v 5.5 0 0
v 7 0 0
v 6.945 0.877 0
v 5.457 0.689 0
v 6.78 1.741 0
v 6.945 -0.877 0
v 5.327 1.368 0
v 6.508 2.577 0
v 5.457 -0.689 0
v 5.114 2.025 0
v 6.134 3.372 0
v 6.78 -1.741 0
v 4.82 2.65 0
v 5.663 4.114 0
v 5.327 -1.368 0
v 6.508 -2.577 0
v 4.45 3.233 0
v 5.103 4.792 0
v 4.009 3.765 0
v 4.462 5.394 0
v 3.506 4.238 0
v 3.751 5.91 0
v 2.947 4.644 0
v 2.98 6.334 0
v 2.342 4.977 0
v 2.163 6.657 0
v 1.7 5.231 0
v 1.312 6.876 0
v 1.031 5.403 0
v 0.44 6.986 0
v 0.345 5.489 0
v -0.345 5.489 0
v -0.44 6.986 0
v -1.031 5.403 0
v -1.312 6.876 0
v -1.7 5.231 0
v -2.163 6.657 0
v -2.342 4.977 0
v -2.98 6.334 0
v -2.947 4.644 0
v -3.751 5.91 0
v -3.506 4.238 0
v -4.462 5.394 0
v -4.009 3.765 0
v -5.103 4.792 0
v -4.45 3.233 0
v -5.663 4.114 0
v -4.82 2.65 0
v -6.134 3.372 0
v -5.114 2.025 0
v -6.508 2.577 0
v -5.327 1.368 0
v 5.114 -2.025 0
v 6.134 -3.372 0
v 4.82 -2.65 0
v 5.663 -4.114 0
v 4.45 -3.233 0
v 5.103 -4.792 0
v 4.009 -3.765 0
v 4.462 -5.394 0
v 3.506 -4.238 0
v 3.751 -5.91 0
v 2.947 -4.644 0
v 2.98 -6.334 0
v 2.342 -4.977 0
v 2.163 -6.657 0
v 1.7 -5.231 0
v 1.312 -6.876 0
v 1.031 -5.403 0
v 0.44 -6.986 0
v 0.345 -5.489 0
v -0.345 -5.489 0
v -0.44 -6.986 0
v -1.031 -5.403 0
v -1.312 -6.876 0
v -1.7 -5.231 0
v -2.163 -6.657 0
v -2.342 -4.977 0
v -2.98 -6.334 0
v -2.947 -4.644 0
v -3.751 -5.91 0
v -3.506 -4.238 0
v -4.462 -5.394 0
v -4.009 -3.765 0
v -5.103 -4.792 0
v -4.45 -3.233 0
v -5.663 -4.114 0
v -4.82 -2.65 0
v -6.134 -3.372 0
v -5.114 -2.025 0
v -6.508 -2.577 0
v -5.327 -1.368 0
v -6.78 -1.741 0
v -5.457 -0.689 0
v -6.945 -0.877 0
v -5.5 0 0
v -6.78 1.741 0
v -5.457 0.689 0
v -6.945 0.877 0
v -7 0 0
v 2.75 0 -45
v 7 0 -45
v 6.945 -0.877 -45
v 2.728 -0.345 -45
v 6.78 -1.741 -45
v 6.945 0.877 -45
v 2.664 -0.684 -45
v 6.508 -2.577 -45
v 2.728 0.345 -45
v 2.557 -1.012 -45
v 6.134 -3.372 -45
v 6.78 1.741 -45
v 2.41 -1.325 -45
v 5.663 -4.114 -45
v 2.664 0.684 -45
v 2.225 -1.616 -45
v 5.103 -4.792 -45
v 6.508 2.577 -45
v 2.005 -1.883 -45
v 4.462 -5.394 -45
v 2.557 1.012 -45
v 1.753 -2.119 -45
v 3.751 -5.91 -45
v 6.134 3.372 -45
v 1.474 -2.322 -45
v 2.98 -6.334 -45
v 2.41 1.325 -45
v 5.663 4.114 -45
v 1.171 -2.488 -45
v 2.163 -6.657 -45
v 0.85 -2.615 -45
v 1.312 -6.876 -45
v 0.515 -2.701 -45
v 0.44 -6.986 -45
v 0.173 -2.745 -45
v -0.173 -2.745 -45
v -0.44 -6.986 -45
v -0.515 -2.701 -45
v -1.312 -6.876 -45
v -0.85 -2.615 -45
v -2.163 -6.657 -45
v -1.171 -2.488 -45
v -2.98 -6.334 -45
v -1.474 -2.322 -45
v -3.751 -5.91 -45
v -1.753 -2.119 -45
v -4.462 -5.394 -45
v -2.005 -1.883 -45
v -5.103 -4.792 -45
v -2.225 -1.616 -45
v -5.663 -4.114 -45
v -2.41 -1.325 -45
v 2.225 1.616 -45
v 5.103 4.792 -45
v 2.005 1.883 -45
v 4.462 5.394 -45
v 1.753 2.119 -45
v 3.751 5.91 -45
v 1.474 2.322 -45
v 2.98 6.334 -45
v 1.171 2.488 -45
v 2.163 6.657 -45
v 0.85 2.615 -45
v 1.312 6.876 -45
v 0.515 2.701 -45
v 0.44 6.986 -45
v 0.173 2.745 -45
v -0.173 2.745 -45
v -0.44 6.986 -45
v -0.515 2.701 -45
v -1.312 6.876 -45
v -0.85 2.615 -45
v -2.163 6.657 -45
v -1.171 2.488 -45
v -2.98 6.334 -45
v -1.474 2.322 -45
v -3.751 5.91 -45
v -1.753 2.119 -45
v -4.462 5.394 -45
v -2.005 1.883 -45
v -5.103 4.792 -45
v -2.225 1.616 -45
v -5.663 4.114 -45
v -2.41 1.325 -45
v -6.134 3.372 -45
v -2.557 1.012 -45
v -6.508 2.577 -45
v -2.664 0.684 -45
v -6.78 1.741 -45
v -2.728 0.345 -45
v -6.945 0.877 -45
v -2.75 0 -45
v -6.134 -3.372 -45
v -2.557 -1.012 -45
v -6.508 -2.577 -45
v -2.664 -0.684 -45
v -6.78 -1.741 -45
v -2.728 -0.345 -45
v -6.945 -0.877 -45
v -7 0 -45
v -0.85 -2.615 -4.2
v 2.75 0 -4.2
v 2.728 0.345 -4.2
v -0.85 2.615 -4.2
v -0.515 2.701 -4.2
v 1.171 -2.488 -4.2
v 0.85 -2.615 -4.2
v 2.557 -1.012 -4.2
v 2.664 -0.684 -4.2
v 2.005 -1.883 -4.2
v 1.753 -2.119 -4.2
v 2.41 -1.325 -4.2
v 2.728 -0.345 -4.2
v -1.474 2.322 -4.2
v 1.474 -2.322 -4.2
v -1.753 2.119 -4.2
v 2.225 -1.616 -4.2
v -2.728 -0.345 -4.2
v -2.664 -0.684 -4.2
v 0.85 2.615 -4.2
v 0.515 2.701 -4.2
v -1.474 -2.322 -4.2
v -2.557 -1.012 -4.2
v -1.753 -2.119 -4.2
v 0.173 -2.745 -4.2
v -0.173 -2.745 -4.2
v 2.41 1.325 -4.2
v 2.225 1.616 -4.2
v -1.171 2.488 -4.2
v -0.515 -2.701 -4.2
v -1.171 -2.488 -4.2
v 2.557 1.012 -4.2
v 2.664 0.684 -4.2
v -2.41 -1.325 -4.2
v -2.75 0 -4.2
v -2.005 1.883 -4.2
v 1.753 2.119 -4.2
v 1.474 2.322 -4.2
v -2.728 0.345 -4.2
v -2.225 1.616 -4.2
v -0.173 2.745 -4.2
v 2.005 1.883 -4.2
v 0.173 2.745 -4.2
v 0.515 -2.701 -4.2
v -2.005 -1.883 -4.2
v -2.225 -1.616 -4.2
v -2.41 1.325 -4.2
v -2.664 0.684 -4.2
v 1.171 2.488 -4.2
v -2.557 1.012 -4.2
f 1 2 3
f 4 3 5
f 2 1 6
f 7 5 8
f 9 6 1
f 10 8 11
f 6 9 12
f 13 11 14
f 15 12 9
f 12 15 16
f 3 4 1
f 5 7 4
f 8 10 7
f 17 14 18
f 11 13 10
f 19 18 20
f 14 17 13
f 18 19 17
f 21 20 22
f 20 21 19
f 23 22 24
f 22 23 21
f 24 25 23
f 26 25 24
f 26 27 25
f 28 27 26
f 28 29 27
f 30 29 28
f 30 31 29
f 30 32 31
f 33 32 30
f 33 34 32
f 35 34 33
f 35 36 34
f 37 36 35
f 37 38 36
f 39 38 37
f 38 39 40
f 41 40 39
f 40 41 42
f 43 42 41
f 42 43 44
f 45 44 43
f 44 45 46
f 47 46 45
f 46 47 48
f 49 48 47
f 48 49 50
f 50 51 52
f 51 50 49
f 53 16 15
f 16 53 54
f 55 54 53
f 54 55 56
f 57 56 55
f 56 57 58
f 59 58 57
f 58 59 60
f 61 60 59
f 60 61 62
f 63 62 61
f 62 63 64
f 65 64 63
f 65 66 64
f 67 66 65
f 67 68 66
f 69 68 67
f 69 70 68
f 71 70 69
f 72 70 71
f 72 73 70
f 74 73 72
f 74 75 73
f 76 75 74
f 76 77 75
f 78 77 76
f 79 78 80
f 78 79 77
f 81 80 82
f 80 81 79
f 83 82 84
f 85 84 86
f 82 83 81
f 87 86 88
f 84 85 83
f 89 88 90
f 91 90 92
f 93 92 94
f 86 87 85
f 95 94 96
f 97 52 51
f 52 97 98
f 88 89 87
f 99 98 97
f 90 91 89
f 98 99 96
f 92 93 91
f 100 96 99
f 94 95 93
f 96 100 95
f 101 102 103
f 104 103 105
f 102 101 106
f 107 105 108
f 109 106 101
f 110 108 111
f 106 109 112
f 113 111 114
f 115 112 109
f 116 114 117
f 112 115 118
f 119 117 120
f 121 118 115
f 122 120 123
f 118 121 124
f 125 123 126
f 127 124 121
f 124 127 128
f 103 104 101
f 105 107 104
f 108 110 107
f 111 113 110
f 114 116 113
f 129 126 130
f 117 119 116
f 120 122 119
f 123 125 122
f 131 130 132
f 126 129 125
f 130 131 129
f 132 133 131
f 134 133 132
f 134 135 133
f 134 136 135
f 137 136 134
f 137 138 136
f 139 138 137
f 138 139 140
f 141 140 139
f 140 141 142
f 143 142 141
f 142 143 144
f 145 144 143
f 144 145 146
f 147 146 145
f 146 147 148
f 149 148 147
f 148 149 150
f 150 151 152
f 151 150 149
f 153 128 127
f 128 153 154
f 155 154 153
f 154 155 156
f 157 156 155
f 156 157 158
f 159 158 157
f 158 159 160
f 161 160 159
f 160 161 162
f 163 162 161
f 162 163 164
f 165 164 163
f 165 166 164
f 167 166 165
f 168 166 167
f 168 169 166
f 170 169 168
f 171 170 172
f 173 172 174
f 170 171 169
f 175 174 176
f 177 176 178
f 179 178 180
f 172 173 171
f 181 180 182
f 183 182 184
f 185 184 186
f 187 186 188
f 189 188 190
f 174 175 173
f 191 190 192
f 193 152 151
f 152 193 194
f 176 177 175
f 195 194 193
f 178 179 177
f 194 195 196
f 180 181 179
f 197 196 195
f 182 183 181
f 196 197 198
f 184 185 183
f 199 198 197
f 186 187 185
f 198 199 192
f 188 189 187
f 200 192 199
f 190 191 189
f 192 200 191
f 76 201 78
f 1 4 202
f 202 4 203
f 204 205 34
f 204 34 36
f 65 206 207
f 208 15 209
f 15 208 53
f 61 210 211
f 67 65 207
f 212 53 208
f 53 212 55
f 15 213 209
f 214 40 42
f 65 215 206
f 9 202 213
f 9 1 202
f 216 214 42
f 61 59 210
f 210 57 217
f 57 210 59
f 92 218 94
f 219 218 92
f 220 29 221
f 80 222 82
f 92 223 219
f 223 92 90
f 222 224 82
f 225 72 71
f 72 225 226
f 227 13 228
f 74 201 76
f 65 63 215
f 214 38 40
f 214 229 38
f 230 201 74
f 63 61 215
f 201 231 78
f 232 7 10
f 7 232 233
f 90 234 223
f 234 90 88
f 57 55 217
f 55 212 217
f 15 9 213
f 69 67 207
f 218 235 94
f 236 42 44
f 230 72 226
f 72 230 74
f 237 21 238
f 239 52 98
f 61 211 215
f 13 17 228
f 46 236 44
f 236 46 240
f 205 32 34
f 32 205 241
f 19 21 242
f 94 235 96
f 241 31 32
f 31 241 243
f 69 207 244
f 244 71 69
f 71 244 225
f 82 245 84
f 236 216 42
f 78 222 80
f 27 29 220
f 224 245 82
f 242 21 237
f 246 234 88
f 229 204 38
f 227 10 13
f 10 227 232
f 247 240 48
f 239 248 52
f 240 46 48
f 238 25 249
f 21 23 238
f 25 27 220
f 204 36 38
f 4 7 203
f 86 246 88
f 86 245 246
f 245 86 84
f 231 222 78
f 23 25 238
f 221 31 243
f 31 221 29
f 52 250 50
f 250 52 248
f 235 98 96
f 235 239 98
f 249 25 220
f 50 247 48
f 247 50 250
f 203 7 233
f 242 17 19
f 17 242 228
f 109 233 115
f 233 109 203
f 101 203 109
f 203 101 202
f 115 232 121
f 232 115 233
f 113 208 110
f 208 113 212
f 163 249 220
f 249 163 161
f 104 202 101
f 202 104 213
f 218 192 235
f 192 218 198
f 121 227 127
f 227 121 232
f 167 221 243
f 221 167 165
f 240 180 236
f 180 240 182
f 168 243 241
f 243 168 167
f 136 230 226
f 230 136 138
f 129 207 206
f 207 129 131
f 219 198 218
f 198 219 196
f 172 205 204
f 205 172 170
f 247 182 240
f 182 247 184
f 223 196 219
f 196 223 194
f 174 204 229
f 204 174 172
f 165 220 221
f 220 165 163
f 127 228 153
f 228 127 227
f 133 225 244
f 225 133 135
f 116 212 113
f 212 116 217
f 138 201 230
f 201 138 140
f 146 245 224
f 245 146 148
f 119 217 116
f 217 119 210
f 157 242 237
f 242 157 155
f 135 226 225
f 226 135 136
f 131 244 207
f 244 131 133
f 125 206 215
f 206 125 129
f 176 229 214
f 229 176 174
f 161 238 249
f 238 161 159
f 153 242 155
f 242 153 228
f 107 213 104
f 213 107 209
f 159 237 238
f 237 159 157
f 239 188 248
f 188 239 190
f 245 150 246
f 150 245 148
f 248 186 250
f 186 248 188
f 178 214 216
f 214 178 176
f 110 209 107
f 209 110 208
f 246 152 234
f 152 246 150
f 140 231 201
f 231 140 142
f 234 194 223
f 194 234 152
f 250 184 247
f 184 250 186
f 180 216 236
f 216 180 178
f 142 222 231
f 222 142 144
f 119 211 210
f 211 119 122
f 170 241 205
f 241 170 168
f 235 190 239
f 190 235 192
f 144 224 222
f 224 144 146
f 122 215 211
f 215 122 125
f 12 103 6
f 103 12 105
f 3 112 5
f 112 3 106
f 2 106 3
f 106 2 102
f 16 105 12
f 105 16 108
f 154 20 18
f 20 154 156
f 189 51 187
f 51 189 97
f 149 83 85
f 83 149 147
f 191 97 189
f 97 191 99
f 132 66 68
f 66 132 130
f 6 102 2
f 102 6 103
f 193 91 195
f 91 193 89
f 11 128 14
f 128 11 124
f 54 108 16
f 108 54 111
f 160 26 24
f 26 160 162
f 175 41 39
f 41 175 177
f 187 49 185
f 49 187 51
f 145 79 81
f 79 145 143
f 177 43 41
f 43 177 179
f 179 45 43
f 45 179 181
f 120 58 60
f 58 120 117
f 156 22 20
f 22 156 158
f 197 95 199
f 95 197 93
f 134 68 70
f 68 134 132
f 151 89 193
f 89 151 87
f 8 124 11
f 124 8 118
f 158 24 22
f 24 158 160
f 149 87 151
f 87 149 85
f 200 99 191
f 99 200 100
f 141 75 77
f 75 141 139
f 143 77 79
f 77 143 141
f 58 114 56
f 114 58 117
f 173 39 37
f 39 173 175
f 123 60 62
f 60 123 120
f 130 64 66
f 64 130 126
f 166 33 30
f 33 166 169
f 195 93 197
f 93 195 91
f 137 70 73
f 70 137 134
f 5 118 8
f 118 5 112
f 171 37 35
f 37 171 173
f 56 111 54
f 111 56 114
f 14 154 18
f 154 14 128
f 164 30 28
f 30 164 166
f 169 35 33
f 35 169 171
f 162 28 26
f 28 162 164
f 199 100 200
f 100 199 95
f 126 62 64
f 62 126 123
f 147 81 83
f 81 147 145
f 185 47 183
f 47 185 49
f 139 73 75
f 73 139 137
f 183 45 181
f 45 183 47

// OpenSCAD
$fn = 50;


difference() {
	union() {
		translate(v = [0, 0, -45.0000000000]) {
			cylinder(h = 45, r = 7.0000000000);
		}
		cylinder(h = 0, r = 10.0000000000);
	}
	union() {
		translate(v = [0, 0, 0]) {
			rotate(a = [0, 0, 0]) {
				difference() {
					union() {
						#translate(v = [0, 0, -45.0000000000]) {
							cylinder(h = 45, r = 2.2500000000);
						}
						#translate(v = [0, 0, -4.2000000000]) {
							cylinder(h = 4.2000000000, r1 = 2.7500000000, r2 = 5.5000000000);
						}
						#translate(v = [0, 0, -45.0000000000]) {
							cylinder(h = 45, r = 2.7500000000);
						}
						#translate(v = [0, 0, -45.0000000000]) {
							cylinder(h = 45, r = 2.2500000000);
						}
					}
					union();
				}
			}
		}
	}
}
